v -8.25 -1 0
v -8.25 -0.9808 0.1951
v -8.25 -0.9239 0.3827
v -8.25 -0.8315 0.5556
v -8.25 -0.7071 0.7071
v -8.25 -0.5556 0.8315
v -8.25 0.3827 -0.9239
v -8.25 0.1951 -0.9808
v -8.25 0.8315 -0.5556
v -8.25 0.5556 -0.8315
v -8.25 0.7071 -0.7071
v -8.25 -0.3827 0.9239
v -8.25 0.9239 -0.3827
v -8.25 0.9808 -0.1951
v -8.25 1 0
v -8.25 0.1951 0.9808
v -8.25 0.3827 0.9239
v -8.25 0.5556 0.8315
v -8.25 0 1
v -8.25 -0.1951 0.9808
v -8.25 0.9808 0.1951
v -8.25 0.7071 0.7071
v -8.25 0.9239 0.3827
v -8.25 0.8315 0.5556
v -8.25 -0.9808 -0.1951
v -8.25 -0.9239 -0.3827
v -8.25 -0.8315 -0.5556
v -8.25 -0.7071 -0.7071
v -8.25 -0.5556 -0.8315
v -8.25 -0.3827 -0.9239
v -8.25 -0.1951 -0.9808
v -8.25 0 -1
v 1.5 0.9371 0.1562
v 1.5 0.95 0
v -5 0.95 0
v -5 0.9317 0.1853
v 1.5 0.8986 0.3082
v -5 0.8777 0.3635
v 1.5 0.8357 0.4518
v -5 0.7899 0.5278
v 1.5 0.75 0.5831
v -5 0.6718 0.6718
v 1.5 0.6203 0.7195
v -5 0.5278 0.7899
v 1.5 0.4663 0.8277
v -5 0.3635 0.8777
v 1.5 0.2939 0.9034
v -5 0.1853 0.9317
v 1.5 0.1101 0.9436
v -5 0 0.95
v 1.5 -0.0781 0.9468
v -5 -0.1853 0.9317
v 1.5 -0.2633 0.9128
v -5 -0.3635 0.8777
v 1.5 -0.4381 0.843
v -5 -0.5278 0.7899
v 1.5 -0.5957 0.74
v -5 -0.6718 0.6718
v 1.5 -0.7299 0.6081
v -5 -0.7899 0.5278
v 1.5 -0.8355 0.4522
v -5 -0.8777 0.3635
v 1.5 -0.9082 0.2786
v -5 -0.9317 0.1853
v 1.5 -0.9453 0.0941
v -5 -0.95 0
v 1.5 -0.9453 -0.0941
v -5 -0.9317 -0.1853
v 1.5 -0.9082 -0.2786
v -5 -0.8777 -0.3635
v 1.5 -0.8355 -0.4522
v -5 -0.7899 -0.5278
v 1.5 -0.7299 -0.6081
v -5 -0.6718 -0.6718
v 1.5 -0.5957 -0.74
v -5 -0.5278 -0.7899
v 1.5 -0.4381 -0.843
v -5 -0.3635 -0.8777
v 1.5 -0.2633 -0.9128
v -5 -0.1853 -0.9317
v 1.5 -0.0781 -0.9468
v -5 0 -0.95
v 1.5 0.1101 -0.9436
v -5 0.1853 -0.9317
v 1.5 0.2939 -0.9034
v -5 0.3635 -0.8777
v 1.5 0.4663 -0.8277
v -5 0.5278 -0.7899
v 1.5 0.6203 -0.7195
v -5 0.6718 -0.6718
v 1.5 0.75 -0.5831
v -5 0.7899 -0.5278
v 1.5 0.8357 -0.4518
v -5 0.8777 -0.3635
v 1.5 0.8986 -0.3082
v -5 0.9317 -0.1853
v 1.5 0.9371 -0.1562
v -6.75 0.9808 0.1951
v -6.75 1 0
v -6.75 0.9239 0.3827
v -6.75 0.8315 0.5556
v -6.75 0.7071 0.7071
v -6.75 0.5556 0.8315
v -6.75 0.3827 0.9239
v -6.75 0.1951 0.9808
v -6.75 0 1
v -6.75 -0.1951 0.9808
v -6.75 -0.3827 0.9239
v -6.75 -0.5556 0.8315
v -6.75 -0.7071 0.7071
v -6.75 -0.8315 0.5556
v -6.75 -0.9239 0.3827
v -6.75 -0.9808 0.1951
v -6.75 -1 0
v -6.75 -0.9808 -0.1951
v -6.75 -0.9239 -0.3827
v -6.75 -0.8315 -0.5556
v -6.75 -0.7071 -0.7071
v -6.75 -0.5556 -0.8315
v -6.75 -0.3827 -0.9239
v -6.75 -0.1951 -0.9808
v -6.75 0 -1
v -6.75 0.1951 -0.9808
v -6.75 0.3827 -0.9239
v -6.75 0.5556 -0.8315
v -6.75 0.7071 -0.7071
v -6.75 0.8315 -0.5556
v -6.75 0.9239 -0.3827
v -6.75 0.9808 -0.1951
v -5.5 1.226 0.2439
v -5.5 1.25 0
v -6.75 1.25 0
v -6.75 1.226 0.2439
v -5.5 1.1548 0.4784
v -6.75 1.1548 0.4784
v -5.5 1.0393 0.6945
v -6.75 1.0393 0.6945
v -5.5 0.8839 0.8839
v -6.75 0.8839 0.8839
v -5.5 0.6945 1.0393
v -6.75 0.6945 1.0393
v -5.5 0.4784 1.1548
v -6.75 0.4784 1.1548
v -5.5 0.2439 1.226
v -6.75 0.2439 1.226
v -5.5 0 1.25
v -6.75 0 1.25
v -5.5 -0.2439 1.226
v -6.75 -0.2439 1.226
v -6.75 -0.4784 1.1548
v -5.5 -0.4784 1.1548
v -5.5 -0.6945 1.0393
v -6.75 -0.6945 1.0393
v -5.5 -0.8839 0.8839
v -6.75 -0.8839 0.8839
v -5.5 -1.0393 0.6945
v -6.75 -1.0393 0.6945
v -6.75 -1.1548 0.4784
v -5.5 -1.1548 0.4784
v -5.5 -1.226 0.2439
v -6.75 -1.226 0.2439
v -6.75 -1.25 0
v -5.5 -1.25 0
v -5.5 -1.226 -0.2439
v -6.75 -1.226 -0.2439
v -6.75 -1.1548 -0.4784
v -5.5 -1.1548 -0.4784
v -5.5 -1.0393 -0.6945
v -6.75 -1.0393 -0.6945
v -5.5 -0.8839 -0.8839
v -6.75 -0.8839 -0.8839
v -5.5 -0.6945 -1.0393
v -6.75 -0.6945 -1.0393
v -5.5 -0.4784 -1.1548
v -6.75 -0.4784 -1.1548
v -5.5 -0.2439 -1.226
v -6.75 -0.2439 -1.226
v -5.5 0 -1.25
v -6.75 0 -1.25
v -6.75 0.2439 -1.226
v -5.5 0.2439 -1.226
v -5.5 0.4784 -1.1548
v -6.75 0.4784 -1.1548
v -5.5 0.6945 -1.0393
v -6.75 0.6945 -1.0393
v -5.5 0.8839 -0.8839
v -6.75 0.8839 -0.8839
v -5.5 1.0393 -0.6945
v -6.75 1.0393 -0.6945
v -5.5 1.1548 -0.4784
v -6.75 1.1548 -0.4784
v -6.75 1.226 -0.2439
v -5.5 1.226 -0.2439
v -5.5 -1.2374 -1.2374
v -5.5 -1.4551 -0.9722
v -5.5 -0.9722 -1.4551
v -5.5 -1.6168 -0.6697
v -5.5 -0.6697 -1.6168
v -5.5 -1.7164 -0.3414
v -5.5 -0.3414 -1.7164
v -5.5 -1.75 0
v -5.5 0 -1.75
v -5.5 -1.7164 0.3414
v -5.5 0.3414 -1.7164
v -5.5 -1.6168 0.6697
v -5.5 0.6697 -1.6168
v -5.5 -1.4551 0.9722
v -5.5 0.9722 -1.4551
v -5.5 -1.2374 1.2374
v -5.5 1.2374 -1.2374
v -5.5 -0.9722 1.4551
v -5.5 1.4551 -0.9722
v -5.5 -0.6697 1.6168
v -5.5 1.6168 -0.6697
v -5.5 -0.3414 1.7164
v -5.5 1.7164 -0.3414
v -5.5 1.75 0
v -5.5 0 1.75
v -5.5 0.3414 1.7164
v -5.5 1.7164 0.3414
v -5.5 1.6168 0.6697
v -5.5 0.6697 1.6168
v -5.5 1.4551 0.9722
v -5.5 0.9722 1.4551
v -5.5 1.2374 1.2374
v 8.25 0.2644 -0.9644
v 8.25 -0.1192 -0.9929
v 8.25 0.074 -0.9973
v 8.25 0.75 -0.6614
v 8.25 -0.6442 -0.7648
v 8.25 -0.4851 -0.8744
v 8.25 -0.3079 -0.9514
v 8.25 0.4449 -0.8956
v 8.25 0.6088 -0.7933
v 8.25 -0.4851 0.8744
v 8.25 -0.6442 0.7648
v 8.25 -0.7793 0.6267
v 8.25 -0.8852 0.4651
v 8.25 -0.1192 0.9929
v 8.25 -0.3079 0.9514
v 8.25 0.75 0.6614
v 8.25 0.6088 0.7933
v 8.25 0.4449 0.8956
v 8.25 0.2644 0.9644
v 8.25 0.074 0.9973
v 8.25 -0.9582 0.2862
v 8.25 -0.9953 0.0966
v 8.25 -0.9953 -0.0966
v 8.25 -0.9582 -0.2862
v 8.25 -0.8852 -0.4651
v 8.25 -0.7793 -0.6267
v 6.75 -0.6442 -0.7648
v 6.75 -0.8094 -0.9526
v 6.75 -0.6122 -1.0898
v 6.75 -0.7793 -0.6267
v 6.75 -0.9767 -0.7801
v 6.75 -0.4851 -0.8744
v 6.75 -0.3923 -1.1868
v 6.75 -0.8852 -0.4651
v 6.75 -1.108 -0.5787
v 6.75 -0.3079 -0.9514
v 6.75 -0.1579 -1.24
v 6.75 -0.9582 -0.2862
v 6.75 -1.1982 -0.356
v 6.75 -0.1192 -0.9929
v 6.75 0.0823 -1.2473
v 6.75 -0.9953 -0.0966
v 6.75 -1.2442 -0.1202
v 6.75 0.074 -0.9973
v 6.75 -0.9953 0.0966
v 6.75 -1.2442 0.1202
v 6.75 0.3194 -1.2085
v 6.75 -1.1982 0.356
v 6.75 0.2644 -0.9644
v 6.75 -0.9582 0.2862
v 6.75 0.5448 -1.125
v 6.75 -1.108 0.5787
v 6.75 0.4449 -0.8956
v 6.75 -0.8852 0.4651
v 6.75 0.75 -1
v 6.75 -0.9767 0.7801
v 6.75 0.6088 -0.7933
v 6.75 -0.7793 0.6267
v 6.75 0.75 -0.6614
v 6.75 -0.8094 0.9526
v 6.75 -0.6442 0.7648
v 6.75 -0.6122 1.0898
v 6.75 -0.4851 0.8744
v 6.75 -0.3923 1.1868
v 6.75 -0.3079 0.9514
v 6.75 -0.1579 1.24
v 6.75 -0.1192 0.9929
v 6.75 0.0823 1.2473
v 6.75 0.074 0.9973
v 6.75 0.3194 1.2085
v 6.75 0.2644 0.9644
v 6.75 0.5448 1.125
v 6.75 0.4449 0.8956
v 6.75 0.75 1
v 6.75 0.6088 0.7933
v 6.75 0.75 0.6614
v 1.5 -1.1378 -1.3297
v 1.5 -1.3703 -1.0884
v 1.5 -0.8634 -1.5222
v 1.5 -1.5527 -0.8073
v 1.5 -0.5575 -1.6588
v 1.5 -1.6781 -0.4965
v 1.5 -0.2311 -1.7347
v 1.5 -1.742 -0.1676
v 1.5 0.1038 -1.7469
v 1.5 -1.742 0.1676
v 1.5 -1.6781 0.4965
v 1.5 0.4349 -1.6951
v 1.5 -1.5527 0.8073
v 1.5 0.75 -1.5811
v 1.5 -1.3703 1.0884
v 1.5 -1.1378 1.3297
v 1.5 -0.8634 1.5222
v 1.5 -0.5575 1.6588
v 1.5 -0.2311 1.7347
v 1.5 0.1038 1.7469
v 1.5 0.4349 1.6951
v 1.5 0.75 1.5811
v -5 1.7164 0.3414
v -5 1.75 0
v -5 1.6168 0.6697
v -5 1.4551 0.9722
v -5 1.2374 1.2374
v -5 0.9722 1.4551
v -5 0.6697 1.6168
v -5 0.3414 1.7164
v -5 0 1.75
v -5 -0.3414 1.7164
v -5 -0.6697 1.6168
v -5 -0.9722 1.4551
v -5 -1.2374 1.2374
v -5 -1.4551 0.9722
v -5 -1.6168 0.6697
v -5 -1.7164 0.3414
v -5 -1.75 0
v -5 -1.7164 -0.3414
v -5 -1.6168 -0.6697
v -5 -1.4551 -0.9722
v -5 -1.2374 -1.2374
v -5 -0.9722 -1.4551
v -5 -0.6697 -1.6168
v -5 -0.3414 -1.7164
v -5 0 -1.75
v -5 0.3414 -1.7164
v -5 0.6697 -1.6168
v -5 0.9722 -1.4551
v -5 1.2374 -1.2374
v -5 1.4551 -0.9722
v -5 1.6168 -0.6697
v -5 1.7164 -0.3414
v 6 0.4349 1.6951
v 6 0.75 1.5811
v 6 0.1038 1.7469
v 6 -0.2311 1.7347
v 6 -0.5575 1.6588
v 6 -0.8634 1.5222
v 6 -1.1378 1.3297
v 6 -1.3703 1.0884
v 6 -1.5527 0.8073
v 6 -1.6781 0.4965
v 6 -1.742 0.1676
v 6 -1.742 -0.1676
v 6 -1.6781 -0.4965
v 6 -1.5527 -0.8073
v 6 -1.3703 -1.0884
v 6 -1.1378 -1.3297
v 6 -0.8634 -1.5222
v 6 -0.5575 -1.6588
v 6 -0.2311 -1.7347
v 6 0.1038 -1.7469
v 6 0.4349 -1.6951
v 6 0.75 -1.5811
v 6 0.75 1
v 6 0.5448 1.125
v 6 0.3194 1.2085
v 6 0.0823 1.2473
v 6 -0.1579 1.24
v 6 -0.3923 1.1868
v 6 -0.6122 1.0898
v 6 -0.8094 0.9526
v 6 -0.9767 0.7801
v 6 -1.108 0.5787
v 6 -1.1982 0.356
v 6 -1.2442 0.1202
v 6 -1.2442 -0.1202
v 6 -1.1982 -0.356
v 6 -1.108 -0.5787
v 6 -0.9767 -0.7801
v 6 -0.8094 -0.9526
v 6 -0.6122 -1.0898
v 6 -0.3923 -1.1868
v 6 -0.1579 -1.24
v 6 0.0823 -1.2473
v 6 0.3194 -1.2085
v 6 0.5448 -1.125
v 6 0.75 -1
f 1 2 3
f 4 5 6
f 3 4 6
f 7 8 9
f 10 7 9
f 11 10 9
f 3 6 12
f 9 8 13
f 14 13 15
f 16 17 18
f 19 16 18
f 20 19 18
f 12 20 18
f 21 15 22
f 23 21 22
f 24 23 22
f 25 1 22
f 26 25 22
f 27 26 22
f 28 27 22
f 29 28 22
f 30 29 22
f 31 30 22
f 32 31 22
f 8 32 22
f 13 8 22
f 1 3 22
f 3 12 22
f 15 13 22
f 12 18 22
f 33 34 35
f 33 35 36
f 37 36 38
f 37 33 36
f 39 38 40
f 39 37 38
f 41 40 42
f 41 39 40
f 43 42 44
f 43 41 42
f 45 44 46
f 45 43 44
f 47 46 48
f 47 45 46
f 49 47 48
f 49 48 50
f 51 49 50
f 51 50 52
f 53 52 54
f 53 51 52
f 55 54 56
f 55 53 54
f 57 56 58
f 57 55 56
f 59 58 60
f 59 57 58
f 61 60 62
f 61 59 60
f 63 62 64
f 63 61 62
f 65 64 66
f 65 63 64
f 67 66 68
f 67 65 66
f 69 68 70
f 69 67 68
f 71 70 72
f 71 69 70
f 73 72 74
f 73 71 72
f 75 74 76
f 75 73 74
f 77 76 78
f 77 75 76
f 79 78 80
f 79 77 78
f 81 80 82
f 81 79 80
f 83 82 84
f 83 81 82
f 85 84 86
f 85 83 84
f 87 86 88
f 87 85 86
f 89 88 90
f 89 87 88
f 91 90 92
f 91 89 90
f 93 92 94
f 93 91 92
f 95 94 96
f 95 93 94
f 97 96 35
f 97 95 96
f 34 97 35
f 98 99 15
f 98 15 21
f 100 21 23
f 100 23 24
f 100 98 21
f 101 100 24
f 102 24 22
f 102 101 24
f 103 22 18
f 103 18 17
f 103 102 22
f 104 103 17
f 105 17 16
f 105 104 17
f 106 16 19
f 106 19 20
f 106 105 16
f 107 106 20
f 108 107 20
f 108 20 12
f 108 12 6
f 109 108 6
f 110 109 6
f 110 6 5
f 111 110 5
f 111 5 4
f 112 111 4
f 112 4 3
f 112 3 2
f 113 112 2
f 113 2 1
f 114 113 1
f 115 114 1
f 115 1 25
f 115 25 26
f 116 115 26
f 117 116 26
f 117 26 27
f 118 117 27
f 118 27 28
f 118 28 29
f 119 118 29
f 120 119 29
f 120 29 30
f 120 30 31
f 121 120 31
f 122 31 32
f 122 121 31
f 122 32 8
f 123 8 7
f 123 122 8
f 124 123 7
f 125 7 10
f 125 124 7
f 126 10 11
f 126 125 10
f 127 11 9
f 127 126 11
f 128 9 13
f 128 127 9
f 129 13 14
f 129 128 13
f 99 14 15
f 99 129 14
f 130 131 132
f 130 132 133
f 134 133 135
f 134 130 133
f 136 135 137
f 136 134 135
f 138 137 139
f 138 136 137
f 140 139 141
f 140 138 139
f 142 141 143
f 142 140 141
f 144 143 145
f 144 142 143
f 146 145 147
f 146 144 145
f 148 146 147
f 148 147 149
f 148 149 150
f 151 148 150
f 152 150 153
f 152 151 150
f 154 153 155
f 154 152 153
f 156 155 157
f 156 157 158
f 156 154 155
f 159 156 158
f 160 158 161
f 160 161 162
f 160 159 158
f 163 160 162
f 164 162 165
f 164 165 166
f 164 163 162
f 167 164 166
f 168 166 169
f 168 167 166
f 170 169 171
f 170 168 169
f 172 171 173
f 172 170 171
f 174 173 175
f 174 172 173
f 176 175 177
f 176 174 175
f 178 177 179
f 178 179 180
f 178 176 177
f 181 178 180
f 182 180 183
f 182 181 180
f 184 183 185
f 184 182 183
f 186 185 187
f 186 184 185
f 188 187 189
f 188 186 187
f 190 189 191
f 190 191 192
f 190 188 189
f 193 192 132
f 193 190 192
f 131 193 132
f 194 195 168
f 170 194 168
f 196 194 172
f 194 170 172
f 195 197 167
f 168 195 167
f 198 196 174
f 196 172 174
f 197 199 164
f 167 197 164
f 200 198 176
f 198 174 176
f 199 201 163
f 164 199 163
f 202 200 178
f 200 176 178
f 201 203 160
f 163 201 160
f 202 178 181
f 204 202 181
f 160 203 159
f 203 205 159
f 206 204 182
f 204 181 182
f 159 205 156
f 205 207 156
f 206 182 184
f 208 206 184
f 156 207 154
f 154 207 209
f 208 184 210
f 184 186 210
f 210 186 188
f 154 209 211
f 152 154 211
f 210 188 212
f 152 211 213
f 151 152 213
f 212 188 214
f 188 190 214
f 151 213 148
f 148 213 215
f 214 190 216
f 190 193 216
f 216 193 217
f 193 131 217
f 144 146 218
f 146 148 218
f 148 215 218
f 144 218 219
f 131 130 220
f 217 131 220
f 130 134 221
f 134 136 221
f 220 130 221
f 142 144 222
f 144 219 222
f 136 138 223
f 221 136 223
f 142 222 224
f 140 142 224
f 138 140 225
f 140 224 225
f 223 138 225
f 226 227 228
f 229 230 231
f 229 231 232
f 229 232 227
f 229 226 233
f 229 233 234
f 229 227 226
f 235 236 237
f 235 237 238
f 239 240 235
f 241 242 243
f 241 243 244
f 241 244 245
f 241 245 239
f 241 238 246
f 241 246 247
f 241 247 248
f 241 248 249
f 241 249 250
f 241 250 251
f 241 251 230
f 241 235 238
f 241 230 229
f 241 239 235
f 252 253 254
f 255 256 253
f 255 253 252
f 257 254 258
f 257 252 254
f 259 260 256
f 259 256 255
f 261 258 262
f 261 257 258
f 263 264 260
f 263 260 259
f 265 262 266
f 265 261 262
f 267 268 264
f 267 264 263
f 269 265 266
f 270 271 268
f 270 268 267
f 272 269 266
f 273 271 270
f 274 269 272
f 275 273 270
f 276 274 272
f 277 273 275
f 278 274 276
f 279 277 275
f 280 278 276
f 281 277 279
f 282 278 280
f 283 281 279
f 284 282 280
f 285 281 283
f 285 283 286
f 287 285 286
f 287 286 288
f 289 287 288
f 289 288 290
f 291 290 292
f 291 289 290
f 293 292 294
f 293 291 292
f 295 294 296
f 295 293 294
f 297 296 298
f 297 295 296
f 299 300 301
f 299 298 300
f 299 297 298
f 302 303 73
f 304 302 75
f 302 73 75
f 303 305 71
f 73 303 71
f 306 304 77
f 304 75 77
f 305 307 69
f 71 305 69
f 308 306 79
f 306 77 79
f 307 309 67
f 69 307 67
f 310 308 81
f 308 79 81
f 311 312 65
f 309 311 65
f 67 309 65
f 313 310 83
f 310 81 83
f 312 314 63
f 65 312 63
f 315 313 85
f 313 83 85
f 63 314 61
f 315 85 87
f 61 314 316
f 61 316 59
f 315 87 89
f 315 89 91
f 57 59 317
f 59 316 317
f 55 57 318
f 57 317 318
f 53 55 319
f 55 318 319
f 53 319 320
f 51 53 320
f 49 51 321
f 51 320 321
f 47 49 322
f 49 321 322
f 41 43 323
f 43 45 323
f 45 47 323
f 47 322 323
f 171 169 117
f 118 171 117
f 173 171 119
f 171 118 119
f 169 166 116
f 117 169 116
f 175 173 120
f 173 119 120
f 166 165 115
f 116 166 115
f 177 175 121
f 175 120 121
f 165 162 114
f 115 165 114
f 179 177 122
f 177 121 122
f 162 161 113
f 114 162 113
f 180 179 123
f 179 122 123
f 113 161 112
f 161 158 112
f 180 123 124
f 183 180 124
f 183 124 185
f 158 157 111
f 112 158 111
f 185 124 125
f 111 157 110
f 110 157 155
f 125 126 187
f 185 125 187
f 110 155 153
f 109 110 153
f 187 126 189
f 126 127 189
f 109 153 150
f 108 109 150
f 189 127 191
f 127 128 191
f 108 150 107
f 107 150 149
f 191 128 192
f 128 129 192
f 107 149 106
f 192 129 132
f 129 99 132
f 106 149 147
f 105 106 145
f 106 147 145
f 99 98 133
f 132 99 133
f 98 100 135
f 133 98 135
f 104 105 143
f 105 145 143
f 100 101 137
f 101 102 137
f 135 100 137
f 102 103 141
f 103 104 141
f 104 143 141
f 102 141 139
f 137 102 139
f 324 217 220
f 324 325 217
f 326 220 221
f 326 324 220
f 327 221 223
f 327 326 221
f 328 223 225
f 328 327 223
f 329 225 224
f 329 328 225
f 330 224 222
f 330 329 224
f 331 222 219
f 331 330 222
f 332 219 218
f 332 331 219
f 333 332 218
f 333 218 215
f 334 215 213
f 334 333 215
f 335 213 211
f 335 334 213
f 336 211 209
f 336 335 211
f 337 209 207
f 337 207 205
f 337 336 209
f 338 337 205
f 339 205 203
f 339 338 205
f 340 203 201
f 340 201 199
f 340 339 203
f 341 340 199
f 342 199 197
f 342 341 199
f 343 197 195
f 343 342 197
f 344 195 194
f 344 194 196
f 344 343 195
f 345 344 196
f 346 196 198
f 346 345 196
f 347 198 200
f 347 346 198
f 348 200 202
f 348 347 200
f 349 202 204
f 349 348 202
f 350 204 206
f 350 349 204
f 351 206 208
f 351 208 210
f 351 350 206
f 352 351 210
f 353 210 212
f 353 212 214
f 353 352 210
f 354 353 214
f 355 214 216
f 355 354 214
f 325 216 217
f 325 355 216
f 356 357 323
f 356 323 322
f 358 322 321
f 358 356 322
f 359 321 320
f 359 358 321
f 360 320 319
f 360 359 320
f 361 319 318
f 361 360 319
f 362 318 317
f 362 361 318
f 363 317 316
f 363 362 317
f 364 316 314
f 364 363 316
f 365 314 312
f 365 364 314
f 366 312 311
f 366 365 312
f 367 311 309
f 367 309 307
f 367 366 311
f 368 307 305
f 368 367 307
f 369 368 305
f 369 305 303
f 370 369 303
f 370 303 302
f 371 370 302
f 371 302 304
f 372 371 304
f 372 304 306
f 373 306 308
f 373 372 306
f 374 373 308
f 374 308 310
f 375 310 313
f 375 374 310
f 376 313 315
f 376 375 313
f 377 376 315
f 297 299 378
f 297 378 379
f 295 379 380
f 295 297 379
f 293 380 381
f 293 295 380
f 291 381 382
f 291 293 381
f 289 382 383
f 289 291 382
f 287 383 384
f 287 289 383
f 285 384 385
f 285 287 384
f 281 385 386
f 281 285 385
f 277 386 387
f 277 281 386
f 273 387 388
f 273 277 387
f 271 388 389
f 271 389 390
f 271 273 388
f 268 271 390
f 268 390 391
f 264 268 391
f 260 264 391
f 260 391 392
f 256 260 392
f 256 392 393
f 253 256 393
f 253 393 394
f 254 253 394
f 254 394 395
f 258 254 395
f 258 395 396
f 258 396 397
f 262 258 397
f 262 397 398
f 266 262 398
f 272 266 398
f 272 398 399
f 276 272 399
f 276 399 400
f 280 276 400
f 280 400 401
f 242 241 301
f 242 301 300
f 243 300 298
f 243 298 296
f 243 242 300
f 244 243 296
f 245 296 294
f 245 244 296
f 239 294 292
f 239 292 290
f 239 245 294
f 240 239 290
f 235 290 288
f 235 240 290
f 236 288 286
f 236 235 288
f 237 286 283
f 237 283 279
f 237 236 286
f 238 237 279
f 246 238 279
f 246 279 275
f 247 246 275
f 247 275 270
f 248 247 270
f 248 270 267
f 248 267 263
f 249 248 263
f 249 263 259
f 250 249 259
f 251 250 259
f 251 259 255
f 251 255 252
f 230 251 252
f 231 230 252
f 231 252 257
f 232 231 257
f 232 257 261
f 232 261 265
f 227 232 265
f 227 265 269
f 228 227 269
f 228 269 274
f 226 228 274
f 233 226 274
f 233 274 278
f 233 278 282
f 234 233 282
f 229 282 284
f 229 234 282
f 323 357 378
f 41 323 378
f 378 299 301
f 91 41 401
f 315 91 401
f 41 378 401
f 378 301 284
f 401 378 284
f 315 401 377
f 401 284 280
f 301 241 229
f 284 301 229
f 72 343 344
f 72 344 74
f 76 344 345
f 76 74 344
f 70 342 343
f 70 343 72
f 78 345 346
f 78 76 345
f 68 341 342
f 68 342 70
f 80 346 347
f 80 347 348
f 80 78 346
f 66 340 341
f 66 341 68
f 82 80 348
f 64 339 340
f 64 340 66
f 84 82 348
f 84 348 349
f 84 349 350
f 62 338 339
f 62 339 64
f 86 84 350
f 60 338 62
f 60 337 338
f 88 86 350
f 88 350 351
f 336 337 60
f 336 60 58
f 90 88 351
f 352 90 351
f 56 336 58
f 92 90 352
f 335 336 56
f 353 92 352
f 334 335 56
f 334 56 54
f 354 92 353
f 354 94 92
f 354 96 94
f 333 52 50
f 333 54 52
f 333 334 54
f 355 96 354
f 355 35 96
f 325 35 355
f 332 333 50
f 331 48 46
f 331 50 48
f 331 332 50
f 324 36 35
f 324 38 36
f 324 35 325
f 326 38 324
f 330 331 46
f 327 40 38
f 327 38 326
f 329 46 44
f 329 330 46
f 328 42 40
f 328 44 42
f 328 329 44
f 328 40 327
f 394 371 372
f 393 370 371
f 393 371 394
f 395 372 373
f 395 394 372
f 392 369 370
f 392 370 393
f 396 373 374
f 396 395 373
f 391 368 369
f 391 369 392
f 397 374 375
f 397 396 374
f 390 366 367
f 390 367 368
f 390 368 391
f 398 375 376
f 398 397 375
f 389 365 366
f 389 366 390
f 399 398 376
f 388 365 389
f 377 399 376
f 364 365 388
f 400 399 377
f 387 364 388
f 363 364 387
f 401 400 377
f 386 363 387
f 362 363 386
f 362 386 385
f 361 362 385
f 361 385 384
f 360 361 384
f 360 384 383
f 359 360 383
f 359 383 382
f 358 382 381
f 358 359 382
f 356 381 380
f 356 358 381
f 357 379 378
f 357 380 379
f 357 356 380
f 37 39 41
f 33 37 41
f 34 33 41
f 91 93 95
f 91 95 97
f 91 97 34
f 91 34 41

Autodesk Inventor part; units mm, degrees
ref_plane "YZ Plane" through (0, 0, 0) normal (1, 0, 0) x (0, 1, 0)
ref_plane "XZ Plane" through (0, 0, 0) normal (0, 1, 0) x (-1, 0, 0)
ref_plane "XY Plane" through (0, 0, 0) normal (0, 0, 1) x (1, 0, 0)
sketch "Sketch1" plane through (0, 0, 0) normal (0, 0, 1) x (1, 0, 0)
  line L0 (-8.25, 0) -> (8.25, 0)
  line L1 (-8.25, 0) -> (-8.25, 1)
  line L2 (-8.25, 1) -> (-6.75, 1)
  line L3 (-6.75, 1) -> (-6.75, 1.25)
  line L4 (-6.75, 1.25) -> (-5.5, 1.25)
  line L5 (-5.5, 1.25) -> (-5.5, 1.25)
  line L6 (-5, 0.95) -> (1.5, 0.95)
  line L7 (1.5, 0.95) -> (1.5, 1.75)
  line L8 (1.5, 1.75) -> (6, 1.75)
  line L9 (6, 1.75) -> (6, 1.25)
  line L10 (6, 1.25) -> (6.75, 1.25)
  line L11 (6.75, 1.25) -> (6.75, 1)
  line L12 (6.75, 1) -> (8.25, 1)
  line L13 (8.25, 1) -> (8.25, 0)
  line L14 (0, 0) -> (0, 3.0708) construction
  line L15 (-5.5, 1.25) -> (-5.5, 1.75)
  line L16 (-5.5, 1.75) -> (-5, 1.75)
  line L17 (-5, 1.75) -> (-5, 0.95)
  dimension "d0" = 2
  dimension "d1" = 16.5
  dimension "d2" = 1.5
  dimension "d3" = 1.5
  dimension "d4" = 2.5
  dimension "d5" = 3.5
  dimension "d6" = 1.9
  dimension "d12" = 7
  dimension "d13" = 0.75
  dimension "d14" = 0.5
  dimension "d16" = 3.5
  dimension "d17" = 1.75
revolve "Revolution1" add sketch "Sketch1" angle 360 about axis through (-8.25, 0, 0) along (1, 0, 0)
sketch "Sketch2" plane through (8.25, 0, 0) normal (1, 0, 0) x (0, 0, -1)
  circle A0 centre (0, 0) radius 1.75 projected
  line L0 (-1.5811, 0.75) -> (1.5811, 0.75)
  dimension "d9" = 0.75
extrude "Extrusion1" cut sketch "Sketch2" against normal up to surface (6.75 mm away) contours L0 A0 picked at (0, 1.0833)
properties part number "MCP axle" material "Stainless Steel"
